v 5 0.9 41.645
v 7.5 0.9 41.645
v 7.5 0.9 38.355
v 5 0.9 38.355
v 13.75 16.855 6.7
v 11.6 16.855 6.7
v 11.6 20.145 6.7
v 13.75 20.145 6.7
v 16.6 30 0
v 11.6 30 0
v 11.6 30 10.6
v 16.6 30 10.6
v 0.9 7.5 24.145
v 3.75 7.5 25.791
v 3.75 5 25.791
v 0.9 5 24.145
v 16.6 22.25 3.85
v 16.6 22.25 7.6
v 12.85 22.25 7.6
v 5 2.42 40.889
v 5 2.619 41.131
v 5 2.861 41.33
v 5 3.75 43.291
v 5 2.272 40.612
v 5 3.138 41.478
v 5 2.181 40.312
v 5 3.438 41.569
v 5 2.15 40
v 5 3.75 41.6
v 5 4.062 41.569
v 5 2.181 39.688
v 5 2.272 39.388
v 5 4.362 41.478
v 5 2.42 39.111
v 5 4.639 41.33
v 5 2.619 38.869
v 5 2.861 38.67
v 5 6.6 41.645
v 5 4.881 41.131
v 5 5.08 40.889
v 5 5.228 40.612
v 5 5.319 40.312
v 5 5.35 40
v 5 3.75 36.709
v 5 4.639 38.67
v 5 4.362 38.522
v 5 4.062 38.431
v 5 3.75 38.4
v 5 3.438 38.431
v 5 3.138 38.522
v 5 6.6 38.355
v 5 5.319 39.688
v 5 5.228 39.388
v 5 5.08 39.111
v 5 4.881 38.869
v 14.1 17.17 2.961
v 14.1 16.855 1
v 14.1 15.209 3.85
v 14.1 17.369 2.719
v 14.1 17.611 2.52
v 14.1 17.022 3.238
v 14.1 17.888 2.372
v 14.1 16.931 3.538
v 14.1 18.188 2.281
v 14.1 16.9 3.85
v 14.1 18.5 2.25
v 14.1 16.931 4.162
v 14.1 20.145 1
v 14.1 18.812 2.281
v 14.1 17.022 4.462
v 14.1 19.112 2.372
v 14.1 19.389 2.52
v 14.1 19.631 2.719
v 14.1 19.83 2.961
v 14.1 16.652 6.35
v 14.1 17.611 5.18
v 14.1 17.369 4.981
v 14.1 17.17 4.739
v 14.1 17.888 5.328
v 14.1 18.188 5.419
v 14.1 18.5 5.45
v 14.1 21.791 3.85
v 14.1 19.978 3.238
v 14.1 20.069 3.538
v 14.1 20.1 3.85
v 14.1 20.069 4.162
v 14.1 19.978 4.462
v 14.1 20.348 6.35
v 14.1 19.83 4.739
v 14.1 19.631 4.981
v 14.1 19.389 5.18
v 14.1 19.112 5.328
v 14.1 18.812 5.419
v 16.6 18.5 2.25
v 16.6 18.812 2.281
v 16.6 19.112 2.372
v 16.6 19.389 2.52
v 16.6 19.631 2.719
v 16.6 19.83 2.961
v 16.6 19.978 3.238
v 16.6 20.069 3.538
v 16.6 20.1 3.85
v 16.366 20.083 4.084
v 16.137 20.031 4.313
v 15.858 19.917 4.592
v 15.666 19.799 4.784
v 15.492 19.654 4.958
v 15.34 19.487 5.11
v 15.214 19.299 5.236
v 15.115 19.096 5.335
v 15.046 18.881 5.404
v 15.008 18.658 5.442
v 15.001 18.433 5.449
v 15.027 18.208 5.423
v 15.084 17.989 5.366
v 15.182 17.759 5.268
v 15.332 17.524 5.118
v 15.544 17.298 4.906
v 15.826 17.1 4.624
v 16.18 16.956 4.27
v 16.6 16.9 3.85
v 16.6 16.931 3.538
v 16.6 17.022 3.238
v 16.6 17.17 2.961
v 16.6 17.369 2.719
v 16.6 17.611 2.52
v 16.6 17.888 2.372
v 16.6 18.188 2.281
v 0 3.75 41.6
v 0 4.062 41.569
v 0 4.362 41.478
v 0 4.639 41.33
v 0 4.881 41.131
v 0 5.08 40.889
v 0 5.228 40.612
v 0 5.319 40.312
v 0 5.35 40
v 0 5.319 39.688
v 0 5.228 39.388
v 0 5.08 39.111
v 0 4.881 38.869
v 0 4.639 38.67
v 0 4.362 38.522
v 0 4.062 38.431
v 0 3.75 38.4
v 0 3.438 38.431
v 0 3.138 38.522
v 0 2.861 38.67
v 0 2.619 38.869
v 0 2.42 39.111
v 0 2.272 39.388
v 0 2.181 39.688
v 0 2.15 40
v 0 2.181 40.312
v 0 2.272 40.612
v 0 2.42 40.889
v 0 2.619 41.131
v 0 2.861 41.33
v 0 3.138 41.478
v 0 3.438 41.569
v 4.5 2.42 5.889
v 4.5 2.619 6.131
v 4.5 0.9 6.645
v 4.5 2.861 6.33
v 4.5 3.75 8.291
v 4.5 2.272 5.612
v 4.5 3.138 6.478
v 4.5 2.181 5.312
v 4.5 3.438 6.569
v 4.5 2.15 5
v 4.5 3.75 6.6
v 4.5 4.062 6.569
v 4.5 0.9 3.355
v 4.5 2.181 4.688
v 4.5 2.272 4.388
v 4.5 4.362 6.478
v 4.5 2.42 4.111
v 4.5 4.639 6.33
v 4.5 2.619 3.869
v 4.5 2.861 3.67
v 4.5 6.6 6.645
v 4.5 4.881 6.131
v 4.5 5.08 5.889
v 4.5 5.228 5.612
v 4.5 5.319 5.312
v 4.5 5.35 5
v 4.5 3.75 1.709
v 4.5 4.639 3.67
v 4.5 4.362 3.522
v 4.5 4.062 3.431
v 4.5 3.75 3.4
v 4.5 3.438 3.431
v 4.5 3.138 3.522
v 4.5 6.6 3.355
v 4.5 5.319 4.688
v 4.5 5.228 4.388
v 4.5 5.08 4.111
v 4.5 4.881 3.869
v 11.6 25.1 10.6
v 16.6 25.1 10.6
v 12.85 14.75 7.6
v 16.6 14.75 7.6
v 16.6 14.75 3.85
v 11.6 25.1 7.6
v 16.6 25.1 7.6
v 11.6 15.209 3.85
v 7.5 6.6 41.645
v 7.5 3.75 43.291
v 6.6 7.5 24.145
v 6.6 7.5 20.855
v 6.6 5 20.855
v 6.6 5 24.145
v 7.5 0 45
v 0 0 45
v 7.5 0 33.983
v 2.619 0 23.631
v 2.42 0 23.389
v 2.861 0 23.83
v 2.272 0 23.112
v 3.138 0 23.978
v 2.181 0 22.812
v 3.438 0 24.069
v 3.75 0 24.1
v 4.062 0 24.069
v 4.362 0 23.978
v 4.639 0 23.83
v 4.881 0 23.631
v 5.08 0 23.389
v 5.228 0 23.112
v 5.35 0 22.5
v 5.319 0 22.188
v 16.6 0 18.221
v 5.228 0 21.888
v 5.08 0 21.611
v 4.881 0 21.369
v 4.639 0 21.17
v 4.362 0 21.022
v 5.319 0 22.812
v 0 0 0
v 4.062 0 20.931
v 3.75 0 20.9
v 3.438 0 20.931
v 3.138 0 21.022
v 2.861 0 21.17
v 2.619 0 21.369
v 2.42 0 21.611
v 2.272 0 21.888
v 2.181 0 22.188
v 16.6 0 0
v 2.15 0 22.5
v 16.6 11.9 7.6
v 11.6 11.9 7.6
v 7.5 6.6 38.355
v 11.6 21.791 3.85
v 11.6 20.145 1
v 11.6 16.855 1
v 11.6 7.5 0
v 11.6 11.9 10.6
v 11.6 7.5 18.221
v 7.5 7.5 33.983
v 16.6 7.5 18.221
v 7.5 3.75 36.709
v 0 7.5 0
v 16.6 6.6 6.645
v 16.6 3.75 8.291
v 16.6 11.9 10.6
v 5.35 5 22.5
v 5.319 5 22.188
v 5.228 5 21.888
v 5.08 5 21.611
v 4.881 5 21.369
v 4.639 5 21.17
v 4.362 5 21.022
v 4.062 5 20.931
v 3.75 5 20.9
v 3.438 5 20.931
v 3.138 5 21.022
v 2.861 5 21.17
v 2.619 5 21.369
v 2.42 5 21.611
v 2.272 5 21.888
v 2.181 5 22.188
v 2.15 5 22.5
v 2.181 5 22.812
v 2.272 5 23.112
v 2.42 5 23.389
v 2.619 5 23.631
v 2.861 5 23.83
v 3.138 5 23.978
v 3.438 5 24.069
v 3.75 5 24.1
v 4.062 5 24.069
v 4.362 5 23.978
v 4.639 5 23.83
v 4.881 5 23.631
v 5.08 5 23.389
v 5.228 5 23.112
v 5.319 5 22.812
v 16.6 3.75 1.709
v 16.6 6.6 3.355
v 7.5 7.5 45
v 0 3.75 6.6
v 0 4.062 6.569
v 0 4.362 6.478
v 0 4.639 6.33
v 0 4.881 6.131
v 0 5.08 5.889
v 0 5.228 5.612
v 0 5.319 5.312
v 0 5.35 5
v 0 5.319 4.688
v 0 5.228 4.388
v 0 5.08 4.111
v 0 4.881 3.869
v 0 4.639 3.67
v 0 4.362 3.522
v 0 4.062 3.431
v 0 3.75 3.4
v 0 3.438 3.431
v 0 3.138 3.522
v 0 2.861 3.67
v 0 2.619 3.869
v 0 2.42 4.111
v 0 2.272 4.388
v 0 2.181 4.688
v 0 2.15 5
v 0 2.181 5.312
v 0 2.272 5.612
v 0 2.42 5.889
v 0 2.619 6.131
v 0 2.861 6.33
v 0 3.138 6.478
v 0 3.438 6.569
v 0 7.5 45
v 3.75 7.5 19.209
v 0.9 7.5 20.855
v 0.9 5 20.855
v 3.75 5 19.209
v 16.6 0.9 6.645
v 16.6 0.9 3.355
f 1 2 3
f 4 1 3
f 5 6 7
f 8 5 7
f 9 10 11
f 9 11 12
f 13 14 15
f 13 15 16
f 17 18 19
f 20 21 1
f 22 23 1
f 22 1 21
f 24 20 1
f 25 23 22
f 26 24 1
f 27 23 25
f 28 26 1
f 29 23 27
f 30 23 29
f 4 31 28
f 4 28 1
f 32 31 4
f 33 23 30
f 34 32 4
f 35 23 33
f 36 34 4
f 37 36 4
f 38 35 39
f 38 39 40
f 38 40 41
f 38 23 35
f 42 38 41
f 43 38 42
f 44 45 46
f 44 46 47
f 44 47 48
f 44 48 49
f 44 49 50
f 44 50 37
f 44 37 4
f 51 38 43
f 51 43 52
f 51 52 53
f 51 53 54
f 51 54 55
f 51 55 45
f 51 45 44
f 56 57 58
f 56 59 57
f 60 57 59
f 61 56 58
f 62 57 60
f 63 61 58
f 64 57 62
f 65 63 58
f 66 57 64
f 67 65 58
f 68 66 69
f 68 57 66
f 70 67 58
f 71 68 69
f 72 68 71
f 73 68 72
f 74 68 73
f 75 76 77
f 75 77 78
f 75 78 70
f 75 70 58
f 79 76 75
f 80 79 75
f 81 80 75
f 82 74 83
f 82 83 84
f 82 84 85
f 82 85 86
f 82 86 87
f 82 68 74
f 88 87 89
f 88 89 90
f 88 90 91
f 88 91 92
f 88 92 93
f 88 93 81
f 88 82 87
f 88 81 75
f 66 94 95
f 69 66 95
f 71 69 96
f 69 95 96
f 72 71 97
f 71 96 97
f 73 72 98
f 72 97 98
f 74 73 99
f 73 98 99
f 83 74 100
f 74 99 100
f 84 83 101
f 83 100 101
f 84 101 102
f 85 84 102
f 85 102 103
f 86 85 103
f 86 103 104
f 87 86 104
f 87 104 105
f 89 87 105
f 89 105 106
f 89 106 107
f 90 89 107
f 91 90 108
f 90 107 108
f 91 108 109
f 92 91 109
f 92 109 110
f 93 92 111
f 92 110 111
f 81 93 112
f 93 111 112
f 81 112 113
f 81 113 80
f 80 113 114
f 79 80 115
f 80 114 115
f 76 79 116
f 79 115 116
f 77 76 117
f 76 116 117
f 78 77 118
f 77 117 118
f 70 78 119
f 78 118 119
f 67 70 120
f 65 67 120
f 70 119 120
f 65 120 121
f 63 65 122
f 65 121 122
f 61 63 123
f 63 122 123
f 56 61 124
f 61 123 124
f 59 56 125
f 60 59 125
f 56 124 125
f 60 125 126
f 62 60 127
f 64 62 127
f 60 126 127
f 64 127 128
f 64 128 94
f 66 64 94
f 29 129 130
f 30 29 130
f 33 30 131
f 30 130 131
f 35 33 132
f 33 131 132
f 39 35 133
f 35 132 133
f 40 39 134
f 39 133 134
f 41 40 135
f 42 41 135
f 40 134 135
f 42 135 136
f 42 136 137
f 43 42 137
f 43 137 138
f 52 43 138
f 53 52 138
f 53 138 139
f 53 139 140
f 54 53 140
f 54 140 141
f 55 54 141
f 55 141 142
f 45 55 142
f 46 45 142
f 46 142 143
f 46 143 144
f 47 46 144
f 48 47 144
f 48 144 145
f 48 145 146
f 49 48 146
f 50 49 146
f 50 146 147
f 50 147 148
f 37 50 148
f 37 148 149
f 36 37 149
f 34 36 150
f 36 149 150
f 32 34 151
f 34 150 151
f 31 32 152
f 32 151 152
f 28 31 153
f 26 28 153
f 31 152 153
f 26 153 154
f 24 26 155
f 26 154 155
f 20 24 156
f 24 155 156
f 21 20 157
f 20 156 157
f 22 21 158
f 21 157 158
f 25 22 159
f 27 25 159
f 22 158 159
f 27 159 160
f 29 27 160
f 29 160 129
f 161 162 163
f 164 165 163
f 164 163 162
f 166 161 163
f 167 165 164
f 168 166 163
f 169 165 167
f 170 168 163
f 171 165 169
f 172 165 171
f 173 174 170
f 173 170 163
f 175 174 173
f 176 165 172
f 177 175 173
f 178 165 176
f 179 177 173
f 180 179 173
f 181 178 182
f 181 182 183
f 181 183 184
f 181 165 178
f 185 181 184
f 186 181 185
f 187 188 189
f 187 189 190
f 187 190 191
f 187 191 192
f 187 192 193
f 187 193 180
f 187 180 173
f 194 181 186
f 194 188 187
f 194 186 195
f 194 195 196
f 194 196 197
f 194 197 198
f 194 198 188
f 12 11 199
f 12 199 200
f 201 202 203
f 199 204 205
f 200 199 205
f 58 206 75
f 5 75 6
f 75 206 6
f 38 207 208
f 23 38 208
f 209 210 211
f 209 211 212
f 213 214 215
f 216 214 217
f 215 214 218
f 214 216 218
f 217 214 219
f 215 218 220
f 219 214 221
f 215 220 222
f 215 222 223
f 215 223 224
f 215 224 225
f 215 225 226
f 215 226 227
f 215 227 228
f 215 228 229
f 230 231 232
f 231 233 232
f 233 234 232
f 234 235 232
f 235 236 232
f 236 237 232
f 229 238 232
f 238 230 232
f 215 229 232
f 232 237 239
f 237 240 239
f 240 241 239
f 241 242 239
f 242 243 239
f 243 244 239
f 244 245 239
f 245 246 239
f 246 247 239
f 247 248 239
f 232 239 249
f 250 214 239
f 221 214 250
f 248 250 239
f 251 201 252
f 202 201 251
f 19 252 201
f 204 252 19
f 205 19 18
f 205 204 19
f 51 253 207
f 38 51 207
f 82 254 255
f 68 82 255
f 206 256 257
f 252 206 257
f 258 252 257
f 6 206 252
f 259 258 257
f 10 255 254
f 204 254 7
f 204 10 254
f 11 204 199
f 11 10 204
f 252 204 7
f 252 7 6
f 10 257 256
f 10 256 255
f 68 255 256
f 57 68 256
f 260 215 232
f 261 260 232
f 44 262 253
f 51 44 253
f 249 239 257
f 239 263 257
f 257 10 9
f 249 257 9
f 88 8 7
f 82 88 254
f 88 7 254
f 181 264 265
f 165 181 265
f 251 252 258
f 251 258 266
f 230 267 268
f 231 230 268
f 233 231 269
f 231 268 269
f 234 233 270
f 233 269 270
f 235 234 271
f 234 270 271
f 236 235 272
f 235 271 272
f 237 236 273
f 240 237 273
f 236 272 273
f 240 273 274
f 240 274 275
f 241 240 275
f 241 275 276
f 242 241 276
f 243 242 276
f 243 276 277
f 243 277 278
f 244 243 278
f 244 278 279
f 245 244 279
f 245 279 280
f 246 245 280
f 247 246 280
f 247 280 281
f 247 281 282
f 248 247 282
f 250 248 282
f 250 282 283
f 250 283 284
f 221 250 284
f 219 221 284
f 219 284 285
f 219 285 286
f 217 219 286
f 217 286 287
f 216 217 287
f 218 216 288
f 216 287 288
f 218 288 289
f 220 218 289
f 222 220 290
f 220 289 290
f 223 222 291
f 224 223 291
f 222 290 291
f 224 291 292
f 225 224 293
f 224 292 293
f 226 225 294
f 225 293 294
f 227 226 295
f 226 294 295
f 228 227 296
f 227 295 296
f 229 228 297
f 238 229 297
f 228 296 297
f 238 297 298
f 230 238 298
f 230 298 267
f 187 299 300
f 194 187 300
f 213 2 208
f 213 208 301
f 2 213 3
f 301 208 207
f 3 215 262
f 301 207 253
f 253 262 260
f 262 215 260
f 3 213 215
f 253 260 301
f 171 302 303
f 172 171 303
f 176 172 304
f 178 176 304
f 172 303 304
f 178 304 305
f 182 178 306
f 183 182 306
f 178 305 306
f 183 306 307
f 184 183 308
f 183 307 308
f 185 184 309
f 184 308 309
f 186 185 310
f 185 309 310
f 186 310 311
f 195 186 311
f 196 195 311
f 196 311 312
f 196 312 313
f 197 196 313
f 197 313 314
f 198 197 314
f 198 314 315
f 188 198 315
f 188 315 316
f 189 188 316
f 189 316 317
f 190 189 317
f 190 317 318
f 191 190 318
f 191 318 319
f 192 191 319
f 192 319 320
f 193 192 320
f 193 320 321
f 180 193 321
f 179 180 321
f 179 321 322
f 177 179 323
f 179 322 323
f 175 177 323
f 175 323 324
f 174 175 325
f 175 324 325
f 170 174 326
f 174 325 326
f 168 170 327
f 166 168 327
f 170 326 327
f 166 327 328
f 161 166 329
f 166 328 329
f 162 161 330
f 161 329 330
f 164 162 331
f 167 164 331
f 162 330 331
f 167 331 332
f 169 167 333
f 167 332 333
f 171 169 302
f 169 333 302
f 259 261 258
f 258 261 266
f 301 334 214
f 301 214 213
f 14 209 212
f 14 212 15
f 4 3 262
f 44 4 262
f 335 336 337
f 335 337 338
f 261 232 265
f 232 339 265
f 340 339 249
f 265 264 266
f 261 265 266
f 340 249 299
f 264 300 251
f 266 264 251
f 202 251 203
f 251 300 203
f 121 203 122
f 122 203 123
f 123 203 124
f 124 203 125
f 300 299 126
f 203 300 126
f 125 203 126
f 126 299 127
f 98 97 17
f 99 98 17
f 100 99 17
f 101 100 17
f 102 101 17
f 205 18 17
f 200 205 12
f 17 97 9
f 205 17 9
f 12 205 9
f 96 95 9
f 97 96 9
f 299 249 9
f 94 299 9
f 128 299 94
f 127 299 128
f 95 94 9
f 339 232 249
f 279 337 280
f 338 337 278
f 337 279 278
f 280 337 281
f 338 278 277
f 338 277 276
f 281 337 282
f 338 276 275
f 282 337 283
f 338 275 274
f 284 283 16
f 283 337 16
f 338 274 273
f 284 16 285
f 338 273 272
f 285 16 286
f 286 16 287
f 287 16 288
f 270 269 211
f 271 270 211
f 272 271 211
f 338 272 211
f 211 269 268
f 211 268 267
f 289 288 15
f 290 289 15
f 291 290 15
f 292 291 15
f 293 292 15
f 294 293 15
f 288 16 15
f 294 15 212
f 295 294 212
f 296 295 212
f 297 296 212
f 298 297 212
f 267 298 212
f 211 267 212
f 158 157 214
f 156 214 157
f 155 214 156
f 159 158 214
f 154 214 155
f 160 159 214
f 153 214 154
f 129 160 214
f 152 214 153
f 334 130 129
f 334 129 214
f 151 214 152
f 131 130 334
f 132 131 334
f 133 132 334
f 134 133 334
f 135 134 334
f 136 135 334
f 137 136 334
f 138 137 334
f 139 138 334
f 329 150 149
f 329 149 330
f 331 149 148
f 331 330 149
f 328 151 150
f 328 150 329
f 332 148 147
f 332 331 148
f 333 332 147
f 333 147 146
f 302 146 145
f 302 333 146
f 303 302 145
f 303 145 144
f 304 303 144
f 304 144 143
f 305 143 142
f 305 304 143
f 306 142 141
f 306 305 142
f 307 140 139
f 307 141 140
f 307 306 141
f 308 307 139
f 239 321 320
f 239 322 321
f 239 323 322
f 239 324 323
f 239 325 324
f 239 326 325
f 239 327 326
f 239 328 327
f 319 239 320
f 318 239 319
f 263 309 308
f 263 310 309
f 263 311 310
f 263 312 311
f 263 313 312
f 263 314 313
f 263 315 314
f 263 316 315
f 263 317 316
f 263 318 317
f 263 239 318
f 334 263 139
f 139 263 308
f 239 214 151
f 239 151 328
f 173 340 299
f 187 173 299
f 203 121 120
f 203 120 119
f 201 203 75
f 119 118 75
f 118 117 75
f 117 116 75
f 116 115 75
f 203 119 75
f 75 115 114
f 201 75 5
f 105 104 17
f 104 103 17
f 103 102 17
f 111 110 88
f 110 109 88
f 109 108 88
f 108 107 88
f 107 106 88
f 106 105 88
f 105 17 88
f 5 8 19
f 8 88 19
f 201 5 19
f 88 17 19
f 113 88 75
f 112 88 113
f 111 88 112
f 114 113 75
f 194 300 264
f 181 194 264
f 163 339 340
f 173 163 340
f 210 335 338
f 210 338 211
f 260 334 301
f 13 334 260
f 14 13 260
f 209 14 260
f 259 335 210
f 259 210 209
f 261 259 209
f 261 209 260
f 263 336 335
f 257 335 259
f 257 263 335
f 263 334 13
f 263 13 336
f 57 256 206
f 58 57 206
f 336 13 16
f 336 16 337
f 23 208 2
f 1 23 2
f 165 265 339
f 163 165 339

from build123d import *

# Parameters (mm, degrees)
SALIENTE_EXTRUIR1_DEPTH = 7.6
CORTAR_EXTRUIR1_REACH   = 18.6
CROQUIS2_R              = 1.6
CROQUIS3_W              = 5
CROQUIS3_H              = 4.9
SALIENTE_EXTRUIR2_DEPTH = 3
SALIENTE_EXTRUIR3_DEPTH = 5
SALIENTE_EXTRUIR4_DEPTH = 7.621024
SALIENTE_EXTRUIR5_DEPTH = 7.5
CROQUIS7_W              = 7.5
CROQUIS7_H              = 7.5
SALIENTE_EXTRUIR6_DEPTH = 26.778976
CORTAR_EXTRUIR2_REACH   = 18.6
CROQUIS8_R              = 1.6
CORTAR_EXTRUIR3_DEPTH   = 2.5
CORTAR_EXTRUIR4_DEPTH   = 2.5
CORTAR_EXTRUIR5_DEPTH   = 12.1
CORTAR_EXTRUIR6_REACH   = 9.5
CROQUIS12_R             = 1.6
CORTAR_EXTRUIR7_DEPTH   = 2.5
CORTAR_EXTRUIR8_DEPTH   = 3.75


with BuildPart() as part:
    # Croquis1 → Saliente-Extruir1 (new body)
    with BuildSketch(Plane.XY):
        Polygon((0, 0), (16.6, 0), (16.6, 30), (11.6, 30), (11.6, 7.5), (0, 7.5), align=None)
    extrude(amount=SALIENTE_EXTRUIR1_DEPTH)

    # Croquis2 → Cortar-Extruir1 (cut, up to next)
    with BuildSketch(Plane(origin=(16.6, 0, 0), x_dir=(0, 0, -1), z_dir=(1, 0, 0)), mode=Mode.PRIVATE) as cortar_extruir1_sk1:
        with Locations((-3.85, 18.5)):
            Circle(CROQUIS2_R)
    cortar_extruir1_tool1 = extrude(cortar_extruir1_sk1.sketch, amount=-CORTAR_EXTRUIR1_REACH, mode=Mode.PRIVATE) & part.part
    add(cortar_extruir1_tool1.solids().sort_by_distance((16.6, 18.5, 3.85))[0], mode=Mode.SUBTRACT)

    # Croquis3 → Saliente-Extruir2 (add)
    with BuildSketch(Plane.XY.offset(7.6)):
        with Locations((14.1, 27.55)):
            Rectangle(CROQUIS3_W, CROQUIS3_H)
        Polygon((11.6, 11.9), (16.6, 11.9), (16.6, 0), (0, 0), (0, 7.5), (11.6, 7.5), align=None)
    extrude(amount=SALIENTE_EXTRUIR2_DEPTH)

    # Croquis4 → Saliente-Extruir3 (add)
    with BuildSketch(Plane(origin=(16.6, 0, 0), x_dir=(0, 0, -1), z_dir=(1, 0, 0))):
        Polygon((-10.6, 7.5), (-18.221023553, 7.5), (-10.6, 11.9), align=None)
    extrude(amount=-SALIENTE_EXTRUIR3_DEPTH)

    # Croquis5 → Saliente-Extruir4 (add)
    with BuildSketch(Plane.XY.offset(10.6)):
        Polygon((16.6, 0), (16.6, 7.5), (11.6, 7.5), (0, 7.5), (0, 0), align=None)
    extrude(amount=SALIENTE_EXTRUIR4_DEPTH)

    # Croquis6 → Saliente-Extruir5 (add)
    with BuildSketch(Plane.XZ):
        Polygon((7.5, 18.221023553), (7.5, 33.982685902), (16.6, 18.221023553), align=None)
    extrude(amount=-SALIENTE_EXTRUIR5_DEPTH)

    # Croquis7 → Saliente-Extruir6 (add)
    with BuildSketch(Plane.XY.offset(18.221023553)):
        with Locations((3.75, 3.75)):
            Rectangle(CROQUIS7_W, CROQUIS7_H)
    extrude(amount=SALIENTE_EXTRUIR6_DEPTH)

    # Croquis8 → Cortar-Extruir2 (cut, up to next)
    with BuildSketch(Plane.ZY, mode=Mode.PRIVATE) as cortar_extruir2_sk1:
        with Locations((40, 3.75)):
            Circle(CROQUIS8_R)
    cortar_extruir2_tool1 = extrude(cortar_extruir2_sk1.sketch, amount=-CORTAR_EXTRUIR2_REACH, mode=Mode.PRIVATE) & part.part
    add(cortar_extruir2_tool1.solids().sort_by_distance((0, 3.75, 40))[0], mode=Mode.SUBTRACT)
    # Croquis8 → Cortar-Extruir2 (cut, up to next)
    with BuildSketch(Plane.ZY, mode=Mode.PRIVATE) as cortar_extruir2_sk2:
        with Locations((5, 3.75)):
            Circle(CROQUIS8_R)
    cortar_extruir2_tool2 = extrude(cortar_extruir2_sk2.sketch, amount=-CORTAR_EXTRUIR2_REACH, mode=Mode.PRIVATE) & part.part
    add(cortar_extruir2_tool2.solids().sort_by_distance((0, 3.75, 5))[0], mode=Mode.SUBTRACT)

    # Croquis9 → Cortar-Extruir3 (cut)
    with BuildSketch(Plane.ZY.offset(-11.6)):
        Polygon((1, 16.854551733), (3.85, 15.209103466), (6.7, 16.854551733), (6.7, 20.145448267), (3.85, 21.790896534), (1, 20.145448267), align=None)
    extrude(amount=-CORTAR_EXTRUIR3_DEPTH, mode=Mode.SUBTRACT)

    # Croquis10 → Cortar-Extruir4 (cut)
    with BuildSketch(Plane(origin=(7.5, 0, 0), x_dir=(0, 0, -1), z_dir=(1, 0, 0))):
        Polygon((-38.354551733, 6.6), (-41.645448267, 6.6), (-43.290896534, 3.75), (-41.645448267, 0.9), (-38.354551733, 0.9), (-36.709103466, 3.75), align=None)
    extrude(amount=-CORTAR_EXTRUIR4_DEPTH, mode=Mode.SUBTRACT)

    # Croquis11 → Cortar-Extruir5 (cut)
    with BuildSketch(Plane(origin=(16.6, 0, 0), x_dir=(0, 0, -1), z_dir=(1, 0, 0))):
        Polygon((-6.645448267, 0.9), (-3.354551733, 0.9), (-1.709103466, 3.75), (-3.354551733, 6.6), (-6.645448267, 6.6), (-8.290896534, 3.75), align=None)
    extrude(amount=-CORTAR_EXTRUIR5_DEPTH, mode=Mode.SUBTRACT)

    # Croquis12 → Cortar-Extruir6 (cut, up to next)
    with BuildSketch(Plane(origin=(0, 7.5, 0), x_dir=(1, 0, 0), z_dir=(0, 1, 0)), mode=Mode.PRIVATE) as cortar_extruir6_sk1:
        with Locations((3.75, -22.5)):
            Circle(CROQUIS12_R)
    cortar_extruir6_tool1 = extrude(cortar_extruir6_sk1.sketch, amount=-CORTAR_EXTRUIR6_REACH, mode=Mode.PRIVATE) & part.part
    add(cortar_extruir6_tool1.solids().sort_by_distance((3.75, 7.5, 22.5))[0], mode=Mode.SUBTRACT)

    # Croquis13 → Cortar-Extruir7 (cut)
    with BuildSketch(Plane.XZ.offset(-7.5)):
        Polygon((6.6, 20.854551733), (6.6, 24.145448267), (3.75, 25.790896534), (0.9, 24.145448267), (0.9, 20.854551733), (3.75, 19.209103466), align=None)
    extrude(amount=CORTAR_EXTRUIR7_DEPTH, mode=Mode.SUBTRACT)

    # Croquis14 → Cortar-Extruir8 (cut, symmetric)
    with BuildSketch(Plane(origin=(0, 18.5, 0), x_dir=(-1, 0, 0), z_dir=(0, 1, 0))):
        Polygon((-16.6, 7.6), (-16.6, 3.85), (-12.85, 7.6), align=None)
    extrude(amount=CORTAR_EXTRUIR8_DEPTH, both=True, mode=Mode.SUBTRACT)


solid = part.part
